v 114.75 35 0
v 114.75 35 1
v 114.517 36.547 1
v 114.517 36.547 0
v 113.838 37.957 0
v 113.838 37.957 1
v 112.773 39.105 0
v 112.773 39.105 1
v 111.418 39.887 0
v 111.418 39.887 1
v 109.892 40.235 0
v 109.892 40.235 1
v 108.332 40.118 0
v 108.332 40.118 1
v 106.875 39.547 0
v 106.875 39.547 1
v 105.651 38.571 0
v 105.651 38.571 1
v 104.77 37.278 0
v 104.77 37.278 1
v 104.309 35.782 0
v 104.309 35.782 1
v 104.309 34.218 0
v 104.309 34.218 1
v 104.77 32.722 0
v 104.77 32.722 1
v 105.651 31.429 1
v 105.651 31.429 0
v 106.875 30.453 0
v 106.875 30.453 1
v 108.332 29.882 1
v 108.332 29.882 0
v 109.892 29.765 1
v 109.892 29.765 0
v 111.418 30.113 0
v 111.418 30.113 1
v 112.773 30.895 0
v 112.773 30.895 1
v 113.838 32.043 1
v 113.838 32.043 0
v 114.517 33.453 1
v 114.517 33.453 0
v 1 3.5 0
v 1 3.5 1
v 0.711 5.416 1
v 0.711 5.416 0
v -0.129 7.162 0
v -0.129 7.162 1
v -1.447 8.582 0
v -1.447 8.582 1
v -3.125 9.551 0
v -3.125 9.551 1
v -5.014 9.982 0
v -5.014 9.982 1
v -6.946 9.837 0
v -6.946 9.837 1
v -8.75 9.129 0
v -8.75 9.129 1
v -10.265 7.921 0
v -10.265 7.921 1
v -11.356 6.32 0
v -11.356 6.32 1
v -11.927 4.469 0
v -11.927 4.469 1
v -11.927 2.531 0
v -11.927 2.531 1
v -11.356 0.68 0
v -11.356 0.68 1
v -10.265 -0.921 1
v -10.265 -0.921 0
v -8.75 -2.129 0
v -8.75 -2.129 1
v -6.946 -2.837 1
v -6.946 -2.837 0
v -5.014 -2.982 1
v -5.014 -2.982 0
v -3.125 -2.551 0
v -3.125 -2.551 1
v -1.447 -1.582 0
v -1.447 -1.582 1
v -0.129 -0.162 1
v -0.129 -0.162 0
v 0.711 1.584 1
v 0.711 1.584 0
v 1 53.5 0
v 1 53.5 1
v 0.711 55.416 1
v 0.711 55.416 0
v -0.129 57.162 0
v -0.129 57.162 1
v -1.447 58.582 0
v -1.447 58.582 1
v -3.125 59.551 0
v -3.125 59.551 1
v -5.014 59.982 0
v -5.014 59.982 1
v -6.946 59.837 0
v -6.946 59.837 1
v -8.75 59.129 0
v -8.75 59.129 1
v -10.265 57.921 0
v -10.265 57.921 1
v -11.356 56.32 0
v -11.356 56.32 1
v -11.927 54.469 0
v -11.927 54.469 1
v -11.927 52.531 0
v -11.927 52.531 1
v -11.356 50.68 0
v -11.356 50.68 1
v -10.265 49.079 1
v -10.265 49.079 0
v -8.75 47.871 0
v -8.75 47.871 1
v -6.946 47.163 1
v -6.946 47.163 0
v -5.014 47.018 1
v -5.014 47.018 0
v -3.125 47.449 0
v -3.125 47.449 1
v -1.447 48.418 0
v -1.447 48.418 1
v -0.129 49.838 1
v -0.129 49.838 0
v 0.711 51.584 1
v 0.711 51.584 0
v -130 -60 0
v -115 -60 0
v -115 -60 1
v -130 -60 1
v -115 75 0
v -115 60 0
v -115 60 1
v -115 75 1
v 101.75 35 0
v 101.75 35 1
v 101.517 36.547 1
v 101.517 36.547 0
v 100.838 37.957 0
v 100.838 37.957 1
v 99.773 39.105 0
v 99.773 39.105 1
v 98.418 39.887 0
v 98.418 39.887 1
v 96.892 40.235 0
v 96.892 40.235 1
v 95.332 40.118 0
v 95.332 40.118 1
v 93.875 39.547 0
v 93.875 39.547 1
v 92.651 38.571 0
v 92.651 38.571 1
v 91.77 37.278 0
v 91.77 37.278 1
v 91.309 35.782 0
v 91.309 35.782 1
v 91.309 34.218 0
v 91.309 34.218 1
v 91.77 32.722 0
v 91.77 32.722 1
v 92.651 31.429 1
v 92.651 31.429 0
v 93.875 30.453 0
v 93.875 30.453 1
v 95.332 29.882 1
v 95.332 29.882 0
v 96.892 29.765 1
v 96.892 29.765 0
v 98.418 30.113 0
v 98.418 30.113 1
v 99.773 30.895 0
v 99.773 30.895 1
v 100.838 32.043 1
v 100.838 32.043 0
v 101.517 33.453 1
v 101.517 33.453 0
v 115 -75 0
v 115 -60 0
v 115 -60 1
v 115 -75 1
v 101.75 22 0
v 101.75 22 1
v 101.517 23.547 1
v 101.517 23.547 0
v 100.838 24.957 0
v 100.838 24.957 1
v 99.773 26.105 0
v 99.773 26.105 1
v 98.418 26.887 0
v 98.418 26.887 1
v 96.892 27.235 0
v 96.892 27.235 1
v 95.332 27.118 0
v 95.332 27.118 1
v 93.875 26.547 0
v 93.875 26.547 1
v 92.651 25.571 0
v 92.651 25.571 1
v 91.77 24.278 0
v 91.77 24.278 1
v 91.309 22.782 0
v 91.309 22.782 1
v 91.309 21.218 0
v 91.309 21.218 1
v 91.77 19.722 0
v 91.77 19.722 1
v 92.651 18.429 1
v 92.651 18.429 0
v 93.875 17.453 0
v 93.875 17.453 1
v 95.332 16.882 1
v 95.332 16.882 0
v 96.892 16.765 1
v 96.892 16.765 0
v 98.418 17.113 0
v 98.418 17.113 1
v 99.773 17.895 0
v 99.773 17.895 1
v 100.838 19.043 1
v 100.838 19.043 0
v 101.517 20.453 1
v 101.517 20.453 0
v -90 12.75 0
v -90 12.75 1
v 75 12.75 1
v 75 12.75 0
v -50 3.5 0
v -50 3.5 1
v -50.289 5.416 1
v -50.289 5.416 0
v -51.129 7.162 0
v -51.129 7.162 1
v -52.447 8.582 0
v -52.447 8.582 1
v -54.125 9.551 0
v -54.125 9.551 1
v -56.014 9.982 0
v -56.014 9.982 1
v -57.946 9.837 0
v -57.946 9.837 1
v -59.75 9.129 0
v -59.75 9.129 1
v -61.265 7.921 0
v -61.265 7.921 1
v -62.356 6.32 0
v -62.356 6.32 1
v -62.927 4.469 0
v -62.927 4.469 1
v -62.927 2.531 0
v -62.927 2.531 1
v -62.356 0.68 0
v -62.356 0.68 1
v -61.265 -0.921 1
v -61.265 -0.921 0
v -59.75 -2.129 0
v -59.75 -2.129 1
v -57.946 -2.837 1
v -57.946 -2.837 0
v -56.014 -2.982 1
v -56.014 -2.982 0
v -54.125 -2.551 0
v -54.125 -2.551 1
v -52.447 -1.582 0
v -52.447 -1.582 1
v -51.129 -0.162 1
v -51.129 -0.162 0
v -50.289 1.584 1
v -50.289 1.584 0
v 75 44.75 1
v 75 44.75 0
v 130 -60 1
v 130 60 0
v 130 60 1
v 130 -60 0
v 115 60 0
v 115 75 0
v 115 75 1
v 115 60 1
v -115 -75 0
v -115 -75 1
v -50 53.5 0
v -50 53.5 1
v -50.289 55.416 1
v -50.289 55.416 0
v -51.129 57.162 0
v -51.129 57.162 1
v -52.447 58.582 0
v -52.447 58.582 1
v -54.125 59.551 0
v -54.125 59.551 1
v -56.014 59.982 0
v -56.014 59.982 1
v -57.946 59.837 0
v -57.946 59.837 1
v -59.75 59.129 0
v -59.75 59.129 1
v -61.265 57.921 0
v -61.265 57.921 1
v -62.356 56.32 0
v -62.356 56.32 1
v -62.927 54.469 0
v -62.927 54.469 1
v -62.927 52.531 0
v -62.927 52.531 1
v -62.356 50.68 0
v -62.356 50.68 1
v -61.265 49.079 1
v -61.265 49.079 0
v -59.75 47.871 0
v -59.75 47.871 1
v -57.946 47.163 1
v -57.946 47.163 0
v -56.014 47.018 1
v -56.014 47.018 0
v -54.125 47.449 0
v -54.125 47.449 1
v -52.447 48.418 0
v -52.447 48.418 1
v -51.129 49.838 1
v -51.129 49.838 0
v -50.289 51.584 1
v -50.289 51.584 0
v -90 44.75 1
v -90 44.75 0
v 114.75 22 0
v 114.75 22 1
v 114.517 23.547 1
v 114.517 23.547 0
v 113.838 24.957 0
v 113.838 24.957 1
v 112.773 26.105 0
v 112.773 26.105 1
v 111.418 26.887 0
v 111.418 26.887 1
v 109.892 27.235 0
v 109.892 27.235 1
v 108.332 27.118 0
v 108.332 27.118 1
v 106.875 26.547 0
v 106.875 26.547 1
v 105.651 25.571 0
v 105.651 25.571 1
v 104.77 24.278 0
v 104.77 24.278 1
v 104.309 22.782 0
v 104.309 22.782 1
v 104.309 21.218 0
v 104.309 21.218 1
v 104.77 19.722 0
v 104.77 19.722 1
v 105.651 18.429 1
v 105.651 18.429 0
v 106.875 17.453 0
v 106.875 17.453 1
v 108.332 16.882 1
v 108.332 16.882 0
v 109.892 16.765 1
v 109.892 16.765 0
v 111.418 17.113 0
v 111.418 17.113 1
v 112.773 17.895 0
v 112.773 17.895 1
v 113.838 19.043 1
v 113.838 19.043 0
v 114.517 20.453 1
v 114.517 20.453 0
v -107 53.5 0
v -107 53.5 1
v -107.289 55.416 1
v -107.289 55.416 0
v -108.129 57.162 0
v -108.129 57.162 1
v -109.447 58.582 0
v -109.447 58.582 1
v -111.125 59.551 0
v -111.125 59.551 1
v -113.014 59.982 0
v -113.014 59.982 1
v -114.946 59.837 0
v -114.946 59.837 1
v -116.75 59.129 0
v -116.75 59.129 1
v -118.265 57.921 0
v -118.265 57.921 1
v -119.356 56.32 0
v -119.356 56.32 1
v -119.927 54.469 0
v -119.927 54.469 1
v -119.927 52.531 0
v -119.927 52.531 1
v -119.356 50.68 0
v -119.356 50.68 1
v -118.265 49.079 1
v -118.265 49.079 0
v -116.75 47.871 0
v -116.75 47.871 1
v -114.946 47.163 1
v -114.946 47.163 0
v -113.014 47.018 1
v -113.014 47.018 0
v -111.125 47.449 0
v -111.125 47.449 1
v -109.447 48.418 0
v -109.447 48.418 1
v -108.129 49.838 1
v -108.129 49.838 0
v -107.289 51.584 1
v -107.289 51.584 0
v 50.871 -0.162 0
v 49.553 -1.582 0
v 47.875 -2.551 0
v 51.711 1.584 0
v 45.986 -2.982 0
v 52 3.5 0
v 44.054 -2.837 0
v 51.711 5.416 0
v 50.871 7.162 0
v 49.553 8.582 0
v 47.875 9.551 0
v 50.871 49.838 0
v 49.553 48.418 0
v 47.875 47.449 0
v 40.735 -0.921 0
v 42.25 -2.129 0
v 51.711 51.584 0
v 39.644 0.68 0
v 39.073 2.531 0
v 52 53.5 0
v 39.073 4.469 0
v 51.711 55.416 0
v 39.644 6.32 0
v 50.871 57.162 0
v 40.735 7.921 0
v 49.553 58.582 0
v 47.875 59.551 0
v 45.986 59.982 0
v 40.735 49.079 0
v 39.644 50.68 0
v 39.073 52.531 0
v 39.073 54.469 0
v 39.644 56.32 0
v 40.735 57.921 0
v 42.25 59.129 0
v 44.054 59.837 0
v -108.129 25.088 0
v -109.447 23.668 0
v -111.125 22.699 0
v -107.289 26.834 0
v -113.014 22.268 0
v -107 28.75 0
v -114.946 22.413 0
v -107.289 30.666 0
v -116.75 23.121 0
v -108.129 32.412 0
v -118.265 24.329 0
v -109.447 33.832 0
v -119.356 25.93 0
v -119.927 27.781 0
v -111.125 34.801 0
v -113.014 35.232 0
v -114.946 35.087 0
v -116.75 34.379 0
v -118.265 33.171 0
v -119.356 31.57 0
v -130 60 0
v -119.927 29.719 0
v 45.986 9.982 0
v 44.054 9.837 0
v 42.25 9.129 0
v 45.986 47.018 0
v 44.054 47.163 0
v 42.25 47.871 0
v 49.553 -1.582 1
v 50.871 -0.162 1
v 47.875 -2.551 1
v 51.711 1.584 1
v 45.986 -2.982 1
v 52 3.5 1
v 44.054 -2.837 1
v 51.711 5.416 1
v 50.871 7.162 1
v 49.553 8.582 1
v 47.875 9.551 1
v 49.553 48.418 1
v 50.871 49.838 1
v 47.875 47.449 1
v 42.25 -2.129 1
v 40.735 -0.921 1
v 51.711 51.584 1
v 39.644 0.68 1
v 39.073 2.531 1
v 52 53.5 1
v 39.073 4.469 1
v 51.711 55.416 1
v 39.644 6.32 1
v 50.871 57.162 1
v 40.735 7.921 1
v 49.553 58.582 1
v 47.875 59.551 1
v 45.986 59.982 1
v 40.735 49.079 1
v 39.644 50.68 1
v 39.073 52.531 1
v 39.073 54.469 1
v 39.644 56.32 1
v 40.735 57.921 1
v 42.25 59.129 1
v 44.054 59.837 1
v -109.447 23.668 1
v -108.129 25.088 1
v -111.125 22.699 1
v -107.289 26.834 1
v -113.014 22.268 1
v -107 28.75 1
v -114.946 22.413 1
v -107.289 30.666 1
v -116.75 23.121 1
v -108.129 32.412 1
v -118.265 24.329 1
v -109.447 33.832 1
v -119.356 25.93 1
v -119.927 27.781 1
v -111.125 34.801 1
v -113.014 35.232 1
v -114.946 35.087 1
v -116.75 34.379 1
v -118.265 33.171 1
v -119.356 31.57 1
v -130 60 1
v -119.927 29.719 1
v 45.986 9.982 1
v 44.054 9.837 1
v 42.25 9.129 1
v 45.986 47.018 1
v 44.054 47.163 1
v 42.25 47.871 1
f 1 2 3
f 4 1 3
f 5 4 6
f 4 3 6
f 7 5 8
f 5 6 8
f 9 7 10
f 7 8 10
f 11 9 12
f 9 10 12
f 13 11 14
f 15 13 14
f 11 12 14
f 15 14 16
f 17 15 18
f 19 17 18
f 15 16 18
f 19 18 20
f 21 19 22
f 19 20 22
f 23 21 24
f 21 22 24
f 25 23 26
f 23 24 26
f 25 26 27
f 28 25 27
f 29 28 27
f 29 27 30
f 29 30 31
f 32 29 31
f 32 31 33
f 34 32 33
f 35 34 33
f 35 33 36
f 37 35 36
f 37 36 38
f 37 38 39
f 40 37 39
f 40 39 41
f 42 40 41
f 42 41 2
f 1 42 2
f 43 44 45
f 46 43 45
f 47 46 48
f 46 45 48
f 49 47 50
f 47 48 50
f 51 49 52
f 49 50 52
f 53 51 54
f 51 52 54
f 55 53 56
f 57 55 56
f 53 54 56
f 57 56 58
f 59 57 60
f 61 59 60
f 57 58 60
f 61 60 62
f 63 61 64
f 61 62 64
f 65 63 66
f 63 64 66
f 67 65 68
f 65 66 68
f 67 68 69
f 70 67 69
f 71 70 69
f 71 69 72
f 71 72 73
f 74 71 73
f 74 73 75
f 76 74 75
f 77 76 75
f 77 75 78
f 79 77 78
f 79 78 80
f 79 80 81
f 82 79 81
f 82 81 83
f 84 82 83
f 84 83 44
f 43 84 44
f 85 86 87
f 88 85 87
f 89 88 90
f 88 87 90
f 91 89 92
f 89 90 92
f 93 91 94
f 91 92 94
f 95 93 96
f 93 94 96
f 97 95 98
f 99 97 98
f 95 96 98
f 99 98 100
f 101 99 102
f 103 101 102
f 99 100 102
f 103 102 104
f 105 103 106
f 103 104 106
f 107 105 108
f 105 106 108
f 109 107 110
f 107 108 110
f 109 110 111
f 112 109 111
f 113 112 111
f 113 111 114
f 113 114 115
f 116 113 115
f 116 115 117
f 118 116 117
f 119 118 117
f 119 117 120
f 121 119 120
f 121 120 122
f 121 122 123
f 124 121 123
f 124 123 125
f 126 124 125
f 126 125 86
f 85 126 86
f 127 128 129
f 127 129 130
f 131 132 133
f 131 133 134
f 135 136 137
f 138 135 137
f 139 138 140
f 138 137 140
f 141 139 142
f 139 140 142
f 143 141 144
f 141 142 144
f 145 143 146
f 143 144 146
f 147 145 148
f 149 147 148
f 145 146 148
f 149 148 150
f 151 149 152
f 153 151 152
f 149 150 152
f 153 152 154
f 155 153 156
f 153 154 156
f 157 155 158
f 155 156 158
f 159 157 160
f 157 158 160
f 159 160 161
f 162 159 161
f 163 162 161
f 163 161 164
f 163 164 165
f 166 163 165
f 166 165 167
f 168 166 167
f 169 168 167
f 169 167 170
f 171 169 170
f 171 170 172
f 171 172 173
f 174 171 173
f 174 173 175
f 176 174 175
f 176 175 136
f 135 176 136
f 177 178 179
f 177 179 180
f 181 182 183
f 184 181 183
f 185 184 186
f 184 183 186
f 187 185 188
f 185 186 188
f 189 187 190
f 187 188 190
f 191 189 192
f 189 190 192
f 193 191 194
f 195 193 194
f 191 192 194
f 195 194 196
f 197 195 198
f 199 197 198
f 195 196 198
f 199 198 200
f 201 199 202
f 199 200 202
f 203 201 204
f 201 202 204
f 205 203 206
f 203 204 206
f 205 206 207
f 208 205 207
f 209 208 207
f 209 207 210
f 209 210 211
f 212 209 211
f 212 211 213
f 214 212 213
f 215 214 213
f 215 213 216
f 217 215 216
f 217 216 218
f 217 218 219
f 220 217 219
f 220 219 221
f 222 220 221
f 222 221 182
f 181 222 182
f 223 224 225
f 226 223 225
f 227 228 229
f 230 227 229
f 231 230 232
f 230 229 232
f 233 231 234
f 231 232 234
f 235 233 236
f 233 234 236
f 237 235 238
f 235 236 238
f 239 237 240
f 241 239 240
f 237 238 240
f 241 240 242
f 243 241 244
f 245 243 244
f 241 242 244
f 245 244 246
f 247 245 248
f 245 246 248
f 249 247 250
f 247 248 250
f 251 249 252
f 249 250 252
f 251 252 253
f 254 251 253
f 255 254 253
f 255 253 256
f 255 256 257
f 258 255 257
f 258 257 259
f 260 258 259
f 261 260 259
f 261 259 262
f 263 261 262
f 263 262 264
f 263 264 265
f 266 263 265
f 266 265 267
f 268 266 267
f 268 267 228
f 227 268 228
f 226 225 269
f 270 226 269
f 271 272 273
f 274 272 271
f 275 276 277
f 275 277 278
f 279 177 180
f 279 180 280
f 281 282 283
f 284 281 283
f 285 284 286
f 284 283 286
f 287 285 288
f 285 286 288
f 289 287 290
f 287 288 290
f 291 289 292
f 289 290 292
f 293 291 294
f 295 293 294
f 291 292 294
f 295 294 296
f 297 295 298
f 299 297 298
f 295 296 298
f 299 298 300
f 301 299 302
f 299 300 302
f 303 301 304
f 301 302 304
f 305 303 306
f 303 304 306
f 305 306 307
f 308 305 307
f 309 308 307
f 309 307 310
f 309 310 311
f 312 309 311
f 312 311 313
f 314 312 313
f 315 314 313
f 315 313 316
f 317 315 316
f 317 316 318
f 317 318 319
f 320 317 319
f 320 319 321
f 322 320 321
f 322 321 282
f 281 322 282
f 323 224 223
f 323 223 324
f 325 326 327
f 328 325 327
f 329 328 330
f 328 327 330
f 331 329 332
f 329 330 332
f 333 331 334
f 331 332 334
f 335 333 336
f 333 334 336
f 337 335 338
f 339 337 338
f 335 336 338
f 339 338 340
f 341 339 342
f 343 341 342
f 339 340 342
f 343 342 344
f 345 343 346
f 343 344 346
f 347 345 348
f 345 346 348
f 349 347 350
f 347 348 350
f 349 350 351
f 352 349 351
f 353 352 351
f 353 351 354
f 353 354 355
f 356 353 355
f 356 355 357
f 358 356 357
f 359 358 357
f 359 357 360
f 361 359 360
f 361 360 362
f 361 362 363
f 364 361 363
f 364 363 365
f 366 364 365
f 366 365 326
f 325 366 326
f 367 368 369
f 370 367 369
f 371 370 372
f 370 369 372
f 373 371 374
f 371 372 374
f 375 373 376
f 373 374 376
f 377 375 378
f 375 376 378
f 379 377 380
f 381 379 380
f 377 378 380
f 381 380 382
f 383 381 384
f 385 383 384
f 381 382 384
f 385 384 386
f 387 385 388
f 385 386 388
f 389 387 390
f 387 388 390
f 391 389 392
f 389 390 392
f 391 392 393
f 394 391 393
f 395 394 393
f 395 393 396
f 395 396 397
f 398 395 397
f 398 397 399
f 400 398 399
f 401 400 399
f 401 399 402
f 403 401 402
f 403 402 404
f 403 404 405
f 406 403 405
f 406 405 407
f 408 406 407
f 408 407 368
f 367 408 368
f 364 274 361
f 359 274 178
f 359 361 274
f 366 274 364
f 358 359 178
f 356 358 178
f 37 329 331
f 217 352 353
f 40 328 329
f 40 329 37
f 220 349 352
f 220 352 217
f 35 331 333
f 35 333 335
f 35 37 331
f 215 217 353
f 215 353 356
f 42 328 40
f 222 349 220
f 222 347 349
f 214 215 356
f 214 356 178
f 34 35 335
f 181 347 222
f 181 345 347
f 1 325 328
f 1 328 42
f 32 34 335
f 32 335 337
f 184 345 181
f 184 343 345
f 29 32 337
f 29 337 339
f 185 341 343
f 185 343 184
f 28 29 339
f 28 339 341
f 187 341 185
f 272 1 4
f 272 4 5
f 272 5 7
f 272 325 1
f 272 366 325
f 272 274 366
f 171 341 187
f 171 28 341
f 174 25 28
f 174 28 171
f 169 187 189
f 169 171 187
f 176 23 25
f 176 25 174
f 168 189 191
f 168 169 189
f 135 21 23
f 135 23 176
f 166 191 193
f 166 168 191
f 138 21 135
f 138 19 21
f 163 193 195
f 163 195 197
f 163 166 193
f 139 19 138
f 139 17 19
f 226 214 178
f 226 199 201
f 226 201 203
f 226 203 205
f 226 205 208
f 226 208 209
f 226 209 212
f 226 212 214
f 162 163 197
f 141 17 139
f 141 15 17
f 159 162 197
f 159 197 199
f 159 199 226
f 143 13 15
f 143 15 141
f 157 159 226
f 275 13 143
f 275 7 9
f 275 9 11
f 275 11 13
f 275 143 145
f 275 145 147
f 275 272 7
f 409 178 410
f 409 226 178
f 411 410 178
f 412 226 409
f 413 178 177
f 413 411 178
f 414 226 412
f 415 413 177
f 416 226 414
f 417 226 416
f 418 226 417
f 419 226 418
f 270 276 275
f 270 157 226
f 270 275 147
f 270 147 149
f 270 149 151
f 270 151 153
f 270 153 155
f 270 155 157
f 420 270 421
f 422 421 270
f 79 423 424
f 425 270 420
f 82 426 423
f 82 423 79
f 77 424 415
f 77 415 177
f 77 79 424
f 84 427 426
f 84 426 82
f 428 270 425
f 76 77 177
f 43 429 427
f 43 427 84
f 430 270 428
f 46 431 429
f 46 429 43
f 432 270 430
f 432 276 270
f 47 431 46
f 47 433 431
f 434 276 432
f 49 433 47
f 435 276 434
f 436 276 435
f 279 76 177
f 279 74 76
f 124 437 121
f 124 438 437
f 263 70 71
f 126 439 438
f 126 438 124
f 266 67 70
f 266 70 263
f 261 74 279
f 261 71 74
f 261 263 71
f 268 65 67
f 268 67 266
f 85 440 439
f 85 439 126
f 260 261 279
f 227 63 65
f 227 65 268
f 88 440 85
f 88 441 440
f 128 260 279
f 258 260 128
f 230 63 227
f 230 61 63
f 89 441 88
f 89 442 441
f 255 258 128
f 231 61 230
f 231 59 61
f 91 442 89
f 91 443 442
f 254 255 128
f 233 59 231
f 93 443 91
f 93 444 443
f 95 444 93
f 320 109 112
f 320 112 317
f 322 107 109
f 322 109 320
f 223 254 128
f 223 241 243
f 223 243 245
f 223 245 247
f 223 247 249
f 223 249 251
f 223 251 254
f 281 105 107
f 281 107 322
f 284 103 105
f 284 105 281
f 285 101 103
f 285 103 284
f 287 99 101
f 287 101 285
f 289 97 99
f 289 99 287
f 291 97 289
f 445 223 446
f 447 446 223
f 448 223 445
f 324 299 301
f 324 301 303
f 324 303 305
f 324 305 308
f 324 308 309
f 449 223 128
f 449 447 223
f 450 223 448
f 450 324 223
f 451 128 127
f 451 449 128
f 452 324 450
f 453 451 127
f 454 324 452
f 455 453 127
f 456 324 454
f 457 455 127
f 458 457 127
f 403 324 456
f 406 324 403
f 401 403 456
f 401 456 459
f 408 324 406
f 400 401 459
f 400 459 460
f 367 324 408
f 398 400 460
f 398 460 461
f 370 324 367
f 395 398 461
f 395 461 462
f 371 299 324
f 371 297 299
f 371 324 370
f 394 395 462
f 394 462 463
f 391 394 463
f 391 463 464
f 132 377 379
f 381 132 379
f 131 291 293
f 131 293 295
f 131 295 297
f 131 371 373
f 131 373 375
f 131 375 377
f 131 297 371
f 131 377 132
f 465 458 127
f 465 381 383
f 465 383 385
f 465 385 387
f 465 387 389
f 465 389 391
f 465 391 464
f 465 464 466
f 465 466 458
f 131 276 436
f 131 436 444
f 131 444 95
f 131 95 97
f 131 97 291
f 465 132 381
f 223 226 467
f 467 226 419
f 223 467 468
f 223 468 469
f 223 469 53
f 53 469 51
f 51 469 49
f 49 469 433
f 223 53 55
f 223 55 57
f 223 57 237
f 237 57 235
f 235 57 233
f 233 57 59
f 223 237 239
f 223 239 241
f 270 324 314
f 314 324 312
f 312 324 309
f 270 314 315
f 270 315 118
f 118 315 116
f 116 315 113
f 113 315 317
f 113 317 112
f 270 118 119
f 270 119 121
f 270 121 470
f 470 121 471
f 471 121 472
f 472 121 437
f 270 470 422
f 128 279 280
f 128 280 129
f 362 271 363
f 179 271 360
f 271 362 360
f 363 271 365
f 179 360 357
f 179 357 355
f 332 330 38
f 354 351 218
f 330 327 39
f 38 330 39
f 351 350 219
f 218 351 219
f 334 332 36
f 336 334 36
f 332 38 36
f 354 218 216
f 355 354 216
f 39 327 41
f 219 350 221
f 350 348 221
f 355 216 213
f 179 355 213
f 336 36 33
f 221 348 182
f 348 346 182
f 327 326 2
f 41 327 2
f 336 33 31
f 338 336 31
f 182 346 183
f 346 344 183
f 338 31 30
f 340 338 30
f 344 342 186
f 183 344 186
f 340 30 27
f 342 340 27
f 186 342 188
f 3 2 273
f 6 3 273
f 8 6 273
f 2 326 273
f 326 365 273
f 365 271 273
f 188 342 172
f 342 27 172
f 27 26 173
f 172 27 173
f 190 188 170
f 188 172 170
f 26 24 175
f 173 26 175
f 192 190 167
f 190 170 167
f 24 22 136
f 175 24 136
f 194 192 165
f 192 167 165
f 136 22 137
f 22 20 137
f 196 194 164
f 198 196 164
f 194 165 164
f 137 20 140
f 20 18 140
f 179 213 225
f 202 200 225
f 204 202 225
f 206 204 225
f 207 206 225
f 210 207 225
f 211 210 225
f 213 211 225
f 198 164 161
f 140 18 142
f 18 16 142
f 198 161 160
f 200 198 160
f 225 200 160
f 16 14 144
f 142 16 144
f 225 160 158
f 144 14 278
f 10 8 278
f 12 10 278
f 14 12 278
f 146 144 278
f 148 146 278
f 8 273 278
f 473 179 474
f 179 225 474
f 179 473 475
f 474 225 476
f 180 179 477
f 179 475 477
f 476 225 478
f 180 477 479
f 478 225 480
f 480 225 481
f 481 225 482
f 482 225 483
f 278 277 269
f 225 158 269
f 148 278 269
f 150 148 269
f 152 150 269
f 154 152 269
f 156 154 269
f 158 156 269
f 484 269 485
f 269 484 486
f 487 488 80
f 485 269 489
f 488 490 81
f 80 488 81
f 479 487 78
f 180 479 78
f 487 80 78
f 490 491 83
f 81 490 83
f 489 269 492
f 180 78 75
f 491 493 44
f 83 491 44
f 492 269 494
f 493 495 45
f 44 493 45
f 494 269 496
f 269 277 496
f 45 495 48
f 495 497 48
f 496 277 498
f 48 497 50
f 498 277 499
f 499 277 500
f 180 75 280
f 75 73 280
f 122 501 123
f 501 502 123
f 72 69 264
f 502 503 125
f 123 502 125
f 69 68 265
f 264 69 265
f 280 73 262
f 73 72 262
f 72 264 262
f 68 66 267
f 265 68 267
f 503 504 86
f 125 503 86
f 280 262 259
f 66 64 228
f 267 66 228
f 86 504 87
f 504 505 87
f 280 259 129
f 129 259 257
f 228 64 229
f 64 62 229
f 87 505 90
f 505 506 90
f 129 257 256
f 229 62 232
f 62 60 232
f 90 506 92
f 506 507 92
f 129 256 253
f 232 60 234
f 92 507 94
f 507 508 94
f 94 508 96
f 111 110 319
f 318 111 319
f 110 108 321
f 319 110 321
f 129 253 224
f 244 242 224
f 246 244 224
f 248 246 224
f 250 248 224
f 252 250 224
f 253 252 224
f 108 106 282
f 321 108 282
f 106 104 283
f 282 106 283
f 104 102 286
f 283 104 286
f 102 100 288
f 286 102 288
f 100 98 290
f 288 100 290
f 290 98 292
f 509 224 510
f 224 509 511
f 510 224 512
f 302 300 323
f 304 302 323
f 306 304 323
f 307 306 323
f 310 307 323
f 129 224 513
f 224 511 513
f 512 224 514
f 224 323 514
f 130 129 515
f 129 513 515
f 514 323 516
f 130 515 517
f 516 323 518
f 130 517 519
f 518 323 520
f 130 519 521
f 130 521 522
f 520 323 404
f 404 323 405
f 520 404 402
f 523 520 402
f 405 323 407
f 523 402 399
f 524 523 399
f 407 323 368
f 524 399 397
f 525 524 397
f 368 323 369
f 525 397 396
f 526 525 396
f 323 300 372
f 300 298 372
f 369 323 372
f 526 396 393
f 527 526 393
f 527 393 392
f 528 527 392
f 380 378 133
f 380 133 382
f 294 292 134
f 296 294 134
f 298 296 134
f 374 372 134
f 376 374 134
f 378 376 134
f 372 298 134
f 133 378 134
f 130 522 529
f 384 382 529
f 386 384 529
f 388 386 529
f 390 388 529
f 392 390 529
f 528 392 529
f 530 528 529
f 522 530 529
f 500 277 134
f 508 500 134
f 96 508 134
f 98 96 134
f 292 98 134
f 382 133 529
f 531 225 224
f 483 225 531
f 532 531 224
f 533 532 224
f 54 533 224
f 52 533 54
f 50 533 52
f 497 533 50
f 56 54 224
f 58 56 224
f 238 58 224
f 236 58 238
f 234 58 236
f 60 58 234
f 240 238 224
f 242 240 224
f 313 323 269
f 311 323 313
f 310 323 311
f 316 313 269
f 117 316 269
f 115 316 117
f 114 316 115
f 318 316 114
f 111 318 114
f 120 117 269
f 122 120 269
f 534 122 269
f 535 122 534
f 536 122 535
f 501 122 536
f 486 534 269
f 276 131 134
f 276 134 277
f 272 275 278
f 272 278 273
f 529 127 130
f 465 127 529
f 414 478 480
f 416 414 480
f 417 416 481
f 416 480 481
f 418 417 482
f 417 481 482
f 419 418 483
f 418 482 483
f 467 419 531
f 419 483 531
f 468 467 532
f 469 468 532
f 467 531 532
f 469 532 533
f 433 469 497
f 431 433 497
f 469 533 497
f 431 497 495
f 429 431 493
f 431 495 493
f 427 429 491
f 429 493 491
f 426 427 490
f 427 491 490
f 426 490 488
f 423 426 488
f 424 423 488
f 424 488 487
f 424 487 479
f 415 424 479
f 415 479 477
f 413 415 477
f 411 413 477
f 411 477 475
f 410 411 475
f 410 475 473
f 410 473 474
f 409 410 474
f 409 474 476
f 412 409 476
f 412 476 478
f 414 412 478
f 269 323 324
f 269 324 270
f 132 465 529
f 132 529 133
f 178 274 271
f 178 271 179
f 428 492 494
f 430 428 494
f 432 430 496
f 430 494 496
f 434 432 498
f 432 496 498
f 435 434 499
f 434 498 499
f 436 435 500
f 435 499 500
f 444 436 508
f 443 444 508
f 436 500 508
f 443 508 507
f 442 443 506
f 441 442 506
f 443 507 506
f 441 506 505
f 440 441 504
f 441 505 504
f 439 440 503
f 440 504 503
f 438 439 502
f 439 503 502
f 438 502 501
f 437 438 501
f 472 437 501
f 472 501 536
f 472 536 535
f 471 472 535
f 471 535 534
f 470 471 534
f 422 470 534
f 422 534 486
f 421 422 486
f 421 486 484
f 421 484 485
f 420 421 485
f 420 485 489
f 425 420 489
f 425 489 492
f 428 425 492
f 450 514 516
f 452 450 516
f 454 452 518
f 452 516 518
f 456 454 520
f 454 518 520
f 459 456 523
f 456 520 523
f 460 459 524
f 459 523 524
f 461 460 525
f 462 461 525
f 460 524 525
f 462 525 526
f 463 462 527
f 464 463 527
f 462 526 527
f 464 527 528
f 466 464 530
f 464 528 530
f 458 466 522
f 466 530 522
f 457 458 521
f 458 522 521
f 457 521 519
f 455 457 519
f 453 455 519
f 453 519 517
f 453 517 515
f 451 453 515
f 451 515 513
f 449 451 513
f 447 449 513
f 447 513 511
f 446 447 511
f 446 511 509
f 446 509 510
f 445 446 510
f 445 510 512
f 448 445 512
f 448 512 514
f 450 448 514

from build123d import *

# Parameters (mm, degrees)
EXTRUDE1_DEPTH        = 1
SKETCH2_W             = 165
SKETCH2_H             = 32
CUT_EXTRUDE1_DEPTH    = 1
SKETCH3_R             = 6.5
SKETCH3_R_2           = 5.25
CORTE_EXTRUS_O1_DEPTH = 2


with BuildPart() as part:
    # Sketch1 → Extrude1 (new body)
    with BuildSketch(Plane.XY):
        Polygon((-115, 75), (115, 75), (115, 60), (130, 60), (130, -60), (115, -60), (115, -75), (-115, -75), (-115, -60), (-130, -60), (-130, 60), (-115, 60), align=None)
    extrude(amount=EXTRUDE1_DEPTH)

    # Sketch2 → Cut-Extrude1 (cut)
    with BuildSketch(Plane.XY.offset(1)):
        with Locations((-7.5, 28.75)):
            Rectangle(SKETCH2_W, SKETCH2_H)
    extrude(amount=-CUT_EXTRUDE1_DEPTH, mode=Mode.SUBTRACT)

    # Sketch3 → Corte-extrusão1 (cut, through all)
    with BuildSketch(Plane.XY.offset(1)):
        with Locations((-113.5, 53.5)):
            Circle(SKETCH3_R)
        with Locations((-113.5, 28.75)):
            Circle(SKETCH3_R)
        with Locations((-56.5, 3.5)):
            Circle(SKETCH3_R)
        with Locations((-5.5, 3.5)):
            Circle(SKETCH3_R)
        with Locations((45.5, 3.5)):
            Circle(SKETCH3_R)
        with Locations((45.5, 53.5)):
            Circle(SKETCH3_R)
        with Locations((-5.5, 53.5)):
            Circle(SKETCH3_R)
        with Locations((-56.5, 53.5)):
            Circle(SKETCH3_R)
        with Locations((96.5, 35)):
            Circle(SKETCH3_R_2)
        with Locations((109.5, 35)):
            Circle(SKETCH3_R_2)
        with Locations((109.5, 22)):
            Circle(SKETCH3_R_2)
        with Locations((96.5, 22)):
            Circle(SKETCH3_R_2)
    extrude(amount=-CORTE_EXTRUS_O1_DEPTH, mode=Mode.SUBTRACT)


solid = part.part
